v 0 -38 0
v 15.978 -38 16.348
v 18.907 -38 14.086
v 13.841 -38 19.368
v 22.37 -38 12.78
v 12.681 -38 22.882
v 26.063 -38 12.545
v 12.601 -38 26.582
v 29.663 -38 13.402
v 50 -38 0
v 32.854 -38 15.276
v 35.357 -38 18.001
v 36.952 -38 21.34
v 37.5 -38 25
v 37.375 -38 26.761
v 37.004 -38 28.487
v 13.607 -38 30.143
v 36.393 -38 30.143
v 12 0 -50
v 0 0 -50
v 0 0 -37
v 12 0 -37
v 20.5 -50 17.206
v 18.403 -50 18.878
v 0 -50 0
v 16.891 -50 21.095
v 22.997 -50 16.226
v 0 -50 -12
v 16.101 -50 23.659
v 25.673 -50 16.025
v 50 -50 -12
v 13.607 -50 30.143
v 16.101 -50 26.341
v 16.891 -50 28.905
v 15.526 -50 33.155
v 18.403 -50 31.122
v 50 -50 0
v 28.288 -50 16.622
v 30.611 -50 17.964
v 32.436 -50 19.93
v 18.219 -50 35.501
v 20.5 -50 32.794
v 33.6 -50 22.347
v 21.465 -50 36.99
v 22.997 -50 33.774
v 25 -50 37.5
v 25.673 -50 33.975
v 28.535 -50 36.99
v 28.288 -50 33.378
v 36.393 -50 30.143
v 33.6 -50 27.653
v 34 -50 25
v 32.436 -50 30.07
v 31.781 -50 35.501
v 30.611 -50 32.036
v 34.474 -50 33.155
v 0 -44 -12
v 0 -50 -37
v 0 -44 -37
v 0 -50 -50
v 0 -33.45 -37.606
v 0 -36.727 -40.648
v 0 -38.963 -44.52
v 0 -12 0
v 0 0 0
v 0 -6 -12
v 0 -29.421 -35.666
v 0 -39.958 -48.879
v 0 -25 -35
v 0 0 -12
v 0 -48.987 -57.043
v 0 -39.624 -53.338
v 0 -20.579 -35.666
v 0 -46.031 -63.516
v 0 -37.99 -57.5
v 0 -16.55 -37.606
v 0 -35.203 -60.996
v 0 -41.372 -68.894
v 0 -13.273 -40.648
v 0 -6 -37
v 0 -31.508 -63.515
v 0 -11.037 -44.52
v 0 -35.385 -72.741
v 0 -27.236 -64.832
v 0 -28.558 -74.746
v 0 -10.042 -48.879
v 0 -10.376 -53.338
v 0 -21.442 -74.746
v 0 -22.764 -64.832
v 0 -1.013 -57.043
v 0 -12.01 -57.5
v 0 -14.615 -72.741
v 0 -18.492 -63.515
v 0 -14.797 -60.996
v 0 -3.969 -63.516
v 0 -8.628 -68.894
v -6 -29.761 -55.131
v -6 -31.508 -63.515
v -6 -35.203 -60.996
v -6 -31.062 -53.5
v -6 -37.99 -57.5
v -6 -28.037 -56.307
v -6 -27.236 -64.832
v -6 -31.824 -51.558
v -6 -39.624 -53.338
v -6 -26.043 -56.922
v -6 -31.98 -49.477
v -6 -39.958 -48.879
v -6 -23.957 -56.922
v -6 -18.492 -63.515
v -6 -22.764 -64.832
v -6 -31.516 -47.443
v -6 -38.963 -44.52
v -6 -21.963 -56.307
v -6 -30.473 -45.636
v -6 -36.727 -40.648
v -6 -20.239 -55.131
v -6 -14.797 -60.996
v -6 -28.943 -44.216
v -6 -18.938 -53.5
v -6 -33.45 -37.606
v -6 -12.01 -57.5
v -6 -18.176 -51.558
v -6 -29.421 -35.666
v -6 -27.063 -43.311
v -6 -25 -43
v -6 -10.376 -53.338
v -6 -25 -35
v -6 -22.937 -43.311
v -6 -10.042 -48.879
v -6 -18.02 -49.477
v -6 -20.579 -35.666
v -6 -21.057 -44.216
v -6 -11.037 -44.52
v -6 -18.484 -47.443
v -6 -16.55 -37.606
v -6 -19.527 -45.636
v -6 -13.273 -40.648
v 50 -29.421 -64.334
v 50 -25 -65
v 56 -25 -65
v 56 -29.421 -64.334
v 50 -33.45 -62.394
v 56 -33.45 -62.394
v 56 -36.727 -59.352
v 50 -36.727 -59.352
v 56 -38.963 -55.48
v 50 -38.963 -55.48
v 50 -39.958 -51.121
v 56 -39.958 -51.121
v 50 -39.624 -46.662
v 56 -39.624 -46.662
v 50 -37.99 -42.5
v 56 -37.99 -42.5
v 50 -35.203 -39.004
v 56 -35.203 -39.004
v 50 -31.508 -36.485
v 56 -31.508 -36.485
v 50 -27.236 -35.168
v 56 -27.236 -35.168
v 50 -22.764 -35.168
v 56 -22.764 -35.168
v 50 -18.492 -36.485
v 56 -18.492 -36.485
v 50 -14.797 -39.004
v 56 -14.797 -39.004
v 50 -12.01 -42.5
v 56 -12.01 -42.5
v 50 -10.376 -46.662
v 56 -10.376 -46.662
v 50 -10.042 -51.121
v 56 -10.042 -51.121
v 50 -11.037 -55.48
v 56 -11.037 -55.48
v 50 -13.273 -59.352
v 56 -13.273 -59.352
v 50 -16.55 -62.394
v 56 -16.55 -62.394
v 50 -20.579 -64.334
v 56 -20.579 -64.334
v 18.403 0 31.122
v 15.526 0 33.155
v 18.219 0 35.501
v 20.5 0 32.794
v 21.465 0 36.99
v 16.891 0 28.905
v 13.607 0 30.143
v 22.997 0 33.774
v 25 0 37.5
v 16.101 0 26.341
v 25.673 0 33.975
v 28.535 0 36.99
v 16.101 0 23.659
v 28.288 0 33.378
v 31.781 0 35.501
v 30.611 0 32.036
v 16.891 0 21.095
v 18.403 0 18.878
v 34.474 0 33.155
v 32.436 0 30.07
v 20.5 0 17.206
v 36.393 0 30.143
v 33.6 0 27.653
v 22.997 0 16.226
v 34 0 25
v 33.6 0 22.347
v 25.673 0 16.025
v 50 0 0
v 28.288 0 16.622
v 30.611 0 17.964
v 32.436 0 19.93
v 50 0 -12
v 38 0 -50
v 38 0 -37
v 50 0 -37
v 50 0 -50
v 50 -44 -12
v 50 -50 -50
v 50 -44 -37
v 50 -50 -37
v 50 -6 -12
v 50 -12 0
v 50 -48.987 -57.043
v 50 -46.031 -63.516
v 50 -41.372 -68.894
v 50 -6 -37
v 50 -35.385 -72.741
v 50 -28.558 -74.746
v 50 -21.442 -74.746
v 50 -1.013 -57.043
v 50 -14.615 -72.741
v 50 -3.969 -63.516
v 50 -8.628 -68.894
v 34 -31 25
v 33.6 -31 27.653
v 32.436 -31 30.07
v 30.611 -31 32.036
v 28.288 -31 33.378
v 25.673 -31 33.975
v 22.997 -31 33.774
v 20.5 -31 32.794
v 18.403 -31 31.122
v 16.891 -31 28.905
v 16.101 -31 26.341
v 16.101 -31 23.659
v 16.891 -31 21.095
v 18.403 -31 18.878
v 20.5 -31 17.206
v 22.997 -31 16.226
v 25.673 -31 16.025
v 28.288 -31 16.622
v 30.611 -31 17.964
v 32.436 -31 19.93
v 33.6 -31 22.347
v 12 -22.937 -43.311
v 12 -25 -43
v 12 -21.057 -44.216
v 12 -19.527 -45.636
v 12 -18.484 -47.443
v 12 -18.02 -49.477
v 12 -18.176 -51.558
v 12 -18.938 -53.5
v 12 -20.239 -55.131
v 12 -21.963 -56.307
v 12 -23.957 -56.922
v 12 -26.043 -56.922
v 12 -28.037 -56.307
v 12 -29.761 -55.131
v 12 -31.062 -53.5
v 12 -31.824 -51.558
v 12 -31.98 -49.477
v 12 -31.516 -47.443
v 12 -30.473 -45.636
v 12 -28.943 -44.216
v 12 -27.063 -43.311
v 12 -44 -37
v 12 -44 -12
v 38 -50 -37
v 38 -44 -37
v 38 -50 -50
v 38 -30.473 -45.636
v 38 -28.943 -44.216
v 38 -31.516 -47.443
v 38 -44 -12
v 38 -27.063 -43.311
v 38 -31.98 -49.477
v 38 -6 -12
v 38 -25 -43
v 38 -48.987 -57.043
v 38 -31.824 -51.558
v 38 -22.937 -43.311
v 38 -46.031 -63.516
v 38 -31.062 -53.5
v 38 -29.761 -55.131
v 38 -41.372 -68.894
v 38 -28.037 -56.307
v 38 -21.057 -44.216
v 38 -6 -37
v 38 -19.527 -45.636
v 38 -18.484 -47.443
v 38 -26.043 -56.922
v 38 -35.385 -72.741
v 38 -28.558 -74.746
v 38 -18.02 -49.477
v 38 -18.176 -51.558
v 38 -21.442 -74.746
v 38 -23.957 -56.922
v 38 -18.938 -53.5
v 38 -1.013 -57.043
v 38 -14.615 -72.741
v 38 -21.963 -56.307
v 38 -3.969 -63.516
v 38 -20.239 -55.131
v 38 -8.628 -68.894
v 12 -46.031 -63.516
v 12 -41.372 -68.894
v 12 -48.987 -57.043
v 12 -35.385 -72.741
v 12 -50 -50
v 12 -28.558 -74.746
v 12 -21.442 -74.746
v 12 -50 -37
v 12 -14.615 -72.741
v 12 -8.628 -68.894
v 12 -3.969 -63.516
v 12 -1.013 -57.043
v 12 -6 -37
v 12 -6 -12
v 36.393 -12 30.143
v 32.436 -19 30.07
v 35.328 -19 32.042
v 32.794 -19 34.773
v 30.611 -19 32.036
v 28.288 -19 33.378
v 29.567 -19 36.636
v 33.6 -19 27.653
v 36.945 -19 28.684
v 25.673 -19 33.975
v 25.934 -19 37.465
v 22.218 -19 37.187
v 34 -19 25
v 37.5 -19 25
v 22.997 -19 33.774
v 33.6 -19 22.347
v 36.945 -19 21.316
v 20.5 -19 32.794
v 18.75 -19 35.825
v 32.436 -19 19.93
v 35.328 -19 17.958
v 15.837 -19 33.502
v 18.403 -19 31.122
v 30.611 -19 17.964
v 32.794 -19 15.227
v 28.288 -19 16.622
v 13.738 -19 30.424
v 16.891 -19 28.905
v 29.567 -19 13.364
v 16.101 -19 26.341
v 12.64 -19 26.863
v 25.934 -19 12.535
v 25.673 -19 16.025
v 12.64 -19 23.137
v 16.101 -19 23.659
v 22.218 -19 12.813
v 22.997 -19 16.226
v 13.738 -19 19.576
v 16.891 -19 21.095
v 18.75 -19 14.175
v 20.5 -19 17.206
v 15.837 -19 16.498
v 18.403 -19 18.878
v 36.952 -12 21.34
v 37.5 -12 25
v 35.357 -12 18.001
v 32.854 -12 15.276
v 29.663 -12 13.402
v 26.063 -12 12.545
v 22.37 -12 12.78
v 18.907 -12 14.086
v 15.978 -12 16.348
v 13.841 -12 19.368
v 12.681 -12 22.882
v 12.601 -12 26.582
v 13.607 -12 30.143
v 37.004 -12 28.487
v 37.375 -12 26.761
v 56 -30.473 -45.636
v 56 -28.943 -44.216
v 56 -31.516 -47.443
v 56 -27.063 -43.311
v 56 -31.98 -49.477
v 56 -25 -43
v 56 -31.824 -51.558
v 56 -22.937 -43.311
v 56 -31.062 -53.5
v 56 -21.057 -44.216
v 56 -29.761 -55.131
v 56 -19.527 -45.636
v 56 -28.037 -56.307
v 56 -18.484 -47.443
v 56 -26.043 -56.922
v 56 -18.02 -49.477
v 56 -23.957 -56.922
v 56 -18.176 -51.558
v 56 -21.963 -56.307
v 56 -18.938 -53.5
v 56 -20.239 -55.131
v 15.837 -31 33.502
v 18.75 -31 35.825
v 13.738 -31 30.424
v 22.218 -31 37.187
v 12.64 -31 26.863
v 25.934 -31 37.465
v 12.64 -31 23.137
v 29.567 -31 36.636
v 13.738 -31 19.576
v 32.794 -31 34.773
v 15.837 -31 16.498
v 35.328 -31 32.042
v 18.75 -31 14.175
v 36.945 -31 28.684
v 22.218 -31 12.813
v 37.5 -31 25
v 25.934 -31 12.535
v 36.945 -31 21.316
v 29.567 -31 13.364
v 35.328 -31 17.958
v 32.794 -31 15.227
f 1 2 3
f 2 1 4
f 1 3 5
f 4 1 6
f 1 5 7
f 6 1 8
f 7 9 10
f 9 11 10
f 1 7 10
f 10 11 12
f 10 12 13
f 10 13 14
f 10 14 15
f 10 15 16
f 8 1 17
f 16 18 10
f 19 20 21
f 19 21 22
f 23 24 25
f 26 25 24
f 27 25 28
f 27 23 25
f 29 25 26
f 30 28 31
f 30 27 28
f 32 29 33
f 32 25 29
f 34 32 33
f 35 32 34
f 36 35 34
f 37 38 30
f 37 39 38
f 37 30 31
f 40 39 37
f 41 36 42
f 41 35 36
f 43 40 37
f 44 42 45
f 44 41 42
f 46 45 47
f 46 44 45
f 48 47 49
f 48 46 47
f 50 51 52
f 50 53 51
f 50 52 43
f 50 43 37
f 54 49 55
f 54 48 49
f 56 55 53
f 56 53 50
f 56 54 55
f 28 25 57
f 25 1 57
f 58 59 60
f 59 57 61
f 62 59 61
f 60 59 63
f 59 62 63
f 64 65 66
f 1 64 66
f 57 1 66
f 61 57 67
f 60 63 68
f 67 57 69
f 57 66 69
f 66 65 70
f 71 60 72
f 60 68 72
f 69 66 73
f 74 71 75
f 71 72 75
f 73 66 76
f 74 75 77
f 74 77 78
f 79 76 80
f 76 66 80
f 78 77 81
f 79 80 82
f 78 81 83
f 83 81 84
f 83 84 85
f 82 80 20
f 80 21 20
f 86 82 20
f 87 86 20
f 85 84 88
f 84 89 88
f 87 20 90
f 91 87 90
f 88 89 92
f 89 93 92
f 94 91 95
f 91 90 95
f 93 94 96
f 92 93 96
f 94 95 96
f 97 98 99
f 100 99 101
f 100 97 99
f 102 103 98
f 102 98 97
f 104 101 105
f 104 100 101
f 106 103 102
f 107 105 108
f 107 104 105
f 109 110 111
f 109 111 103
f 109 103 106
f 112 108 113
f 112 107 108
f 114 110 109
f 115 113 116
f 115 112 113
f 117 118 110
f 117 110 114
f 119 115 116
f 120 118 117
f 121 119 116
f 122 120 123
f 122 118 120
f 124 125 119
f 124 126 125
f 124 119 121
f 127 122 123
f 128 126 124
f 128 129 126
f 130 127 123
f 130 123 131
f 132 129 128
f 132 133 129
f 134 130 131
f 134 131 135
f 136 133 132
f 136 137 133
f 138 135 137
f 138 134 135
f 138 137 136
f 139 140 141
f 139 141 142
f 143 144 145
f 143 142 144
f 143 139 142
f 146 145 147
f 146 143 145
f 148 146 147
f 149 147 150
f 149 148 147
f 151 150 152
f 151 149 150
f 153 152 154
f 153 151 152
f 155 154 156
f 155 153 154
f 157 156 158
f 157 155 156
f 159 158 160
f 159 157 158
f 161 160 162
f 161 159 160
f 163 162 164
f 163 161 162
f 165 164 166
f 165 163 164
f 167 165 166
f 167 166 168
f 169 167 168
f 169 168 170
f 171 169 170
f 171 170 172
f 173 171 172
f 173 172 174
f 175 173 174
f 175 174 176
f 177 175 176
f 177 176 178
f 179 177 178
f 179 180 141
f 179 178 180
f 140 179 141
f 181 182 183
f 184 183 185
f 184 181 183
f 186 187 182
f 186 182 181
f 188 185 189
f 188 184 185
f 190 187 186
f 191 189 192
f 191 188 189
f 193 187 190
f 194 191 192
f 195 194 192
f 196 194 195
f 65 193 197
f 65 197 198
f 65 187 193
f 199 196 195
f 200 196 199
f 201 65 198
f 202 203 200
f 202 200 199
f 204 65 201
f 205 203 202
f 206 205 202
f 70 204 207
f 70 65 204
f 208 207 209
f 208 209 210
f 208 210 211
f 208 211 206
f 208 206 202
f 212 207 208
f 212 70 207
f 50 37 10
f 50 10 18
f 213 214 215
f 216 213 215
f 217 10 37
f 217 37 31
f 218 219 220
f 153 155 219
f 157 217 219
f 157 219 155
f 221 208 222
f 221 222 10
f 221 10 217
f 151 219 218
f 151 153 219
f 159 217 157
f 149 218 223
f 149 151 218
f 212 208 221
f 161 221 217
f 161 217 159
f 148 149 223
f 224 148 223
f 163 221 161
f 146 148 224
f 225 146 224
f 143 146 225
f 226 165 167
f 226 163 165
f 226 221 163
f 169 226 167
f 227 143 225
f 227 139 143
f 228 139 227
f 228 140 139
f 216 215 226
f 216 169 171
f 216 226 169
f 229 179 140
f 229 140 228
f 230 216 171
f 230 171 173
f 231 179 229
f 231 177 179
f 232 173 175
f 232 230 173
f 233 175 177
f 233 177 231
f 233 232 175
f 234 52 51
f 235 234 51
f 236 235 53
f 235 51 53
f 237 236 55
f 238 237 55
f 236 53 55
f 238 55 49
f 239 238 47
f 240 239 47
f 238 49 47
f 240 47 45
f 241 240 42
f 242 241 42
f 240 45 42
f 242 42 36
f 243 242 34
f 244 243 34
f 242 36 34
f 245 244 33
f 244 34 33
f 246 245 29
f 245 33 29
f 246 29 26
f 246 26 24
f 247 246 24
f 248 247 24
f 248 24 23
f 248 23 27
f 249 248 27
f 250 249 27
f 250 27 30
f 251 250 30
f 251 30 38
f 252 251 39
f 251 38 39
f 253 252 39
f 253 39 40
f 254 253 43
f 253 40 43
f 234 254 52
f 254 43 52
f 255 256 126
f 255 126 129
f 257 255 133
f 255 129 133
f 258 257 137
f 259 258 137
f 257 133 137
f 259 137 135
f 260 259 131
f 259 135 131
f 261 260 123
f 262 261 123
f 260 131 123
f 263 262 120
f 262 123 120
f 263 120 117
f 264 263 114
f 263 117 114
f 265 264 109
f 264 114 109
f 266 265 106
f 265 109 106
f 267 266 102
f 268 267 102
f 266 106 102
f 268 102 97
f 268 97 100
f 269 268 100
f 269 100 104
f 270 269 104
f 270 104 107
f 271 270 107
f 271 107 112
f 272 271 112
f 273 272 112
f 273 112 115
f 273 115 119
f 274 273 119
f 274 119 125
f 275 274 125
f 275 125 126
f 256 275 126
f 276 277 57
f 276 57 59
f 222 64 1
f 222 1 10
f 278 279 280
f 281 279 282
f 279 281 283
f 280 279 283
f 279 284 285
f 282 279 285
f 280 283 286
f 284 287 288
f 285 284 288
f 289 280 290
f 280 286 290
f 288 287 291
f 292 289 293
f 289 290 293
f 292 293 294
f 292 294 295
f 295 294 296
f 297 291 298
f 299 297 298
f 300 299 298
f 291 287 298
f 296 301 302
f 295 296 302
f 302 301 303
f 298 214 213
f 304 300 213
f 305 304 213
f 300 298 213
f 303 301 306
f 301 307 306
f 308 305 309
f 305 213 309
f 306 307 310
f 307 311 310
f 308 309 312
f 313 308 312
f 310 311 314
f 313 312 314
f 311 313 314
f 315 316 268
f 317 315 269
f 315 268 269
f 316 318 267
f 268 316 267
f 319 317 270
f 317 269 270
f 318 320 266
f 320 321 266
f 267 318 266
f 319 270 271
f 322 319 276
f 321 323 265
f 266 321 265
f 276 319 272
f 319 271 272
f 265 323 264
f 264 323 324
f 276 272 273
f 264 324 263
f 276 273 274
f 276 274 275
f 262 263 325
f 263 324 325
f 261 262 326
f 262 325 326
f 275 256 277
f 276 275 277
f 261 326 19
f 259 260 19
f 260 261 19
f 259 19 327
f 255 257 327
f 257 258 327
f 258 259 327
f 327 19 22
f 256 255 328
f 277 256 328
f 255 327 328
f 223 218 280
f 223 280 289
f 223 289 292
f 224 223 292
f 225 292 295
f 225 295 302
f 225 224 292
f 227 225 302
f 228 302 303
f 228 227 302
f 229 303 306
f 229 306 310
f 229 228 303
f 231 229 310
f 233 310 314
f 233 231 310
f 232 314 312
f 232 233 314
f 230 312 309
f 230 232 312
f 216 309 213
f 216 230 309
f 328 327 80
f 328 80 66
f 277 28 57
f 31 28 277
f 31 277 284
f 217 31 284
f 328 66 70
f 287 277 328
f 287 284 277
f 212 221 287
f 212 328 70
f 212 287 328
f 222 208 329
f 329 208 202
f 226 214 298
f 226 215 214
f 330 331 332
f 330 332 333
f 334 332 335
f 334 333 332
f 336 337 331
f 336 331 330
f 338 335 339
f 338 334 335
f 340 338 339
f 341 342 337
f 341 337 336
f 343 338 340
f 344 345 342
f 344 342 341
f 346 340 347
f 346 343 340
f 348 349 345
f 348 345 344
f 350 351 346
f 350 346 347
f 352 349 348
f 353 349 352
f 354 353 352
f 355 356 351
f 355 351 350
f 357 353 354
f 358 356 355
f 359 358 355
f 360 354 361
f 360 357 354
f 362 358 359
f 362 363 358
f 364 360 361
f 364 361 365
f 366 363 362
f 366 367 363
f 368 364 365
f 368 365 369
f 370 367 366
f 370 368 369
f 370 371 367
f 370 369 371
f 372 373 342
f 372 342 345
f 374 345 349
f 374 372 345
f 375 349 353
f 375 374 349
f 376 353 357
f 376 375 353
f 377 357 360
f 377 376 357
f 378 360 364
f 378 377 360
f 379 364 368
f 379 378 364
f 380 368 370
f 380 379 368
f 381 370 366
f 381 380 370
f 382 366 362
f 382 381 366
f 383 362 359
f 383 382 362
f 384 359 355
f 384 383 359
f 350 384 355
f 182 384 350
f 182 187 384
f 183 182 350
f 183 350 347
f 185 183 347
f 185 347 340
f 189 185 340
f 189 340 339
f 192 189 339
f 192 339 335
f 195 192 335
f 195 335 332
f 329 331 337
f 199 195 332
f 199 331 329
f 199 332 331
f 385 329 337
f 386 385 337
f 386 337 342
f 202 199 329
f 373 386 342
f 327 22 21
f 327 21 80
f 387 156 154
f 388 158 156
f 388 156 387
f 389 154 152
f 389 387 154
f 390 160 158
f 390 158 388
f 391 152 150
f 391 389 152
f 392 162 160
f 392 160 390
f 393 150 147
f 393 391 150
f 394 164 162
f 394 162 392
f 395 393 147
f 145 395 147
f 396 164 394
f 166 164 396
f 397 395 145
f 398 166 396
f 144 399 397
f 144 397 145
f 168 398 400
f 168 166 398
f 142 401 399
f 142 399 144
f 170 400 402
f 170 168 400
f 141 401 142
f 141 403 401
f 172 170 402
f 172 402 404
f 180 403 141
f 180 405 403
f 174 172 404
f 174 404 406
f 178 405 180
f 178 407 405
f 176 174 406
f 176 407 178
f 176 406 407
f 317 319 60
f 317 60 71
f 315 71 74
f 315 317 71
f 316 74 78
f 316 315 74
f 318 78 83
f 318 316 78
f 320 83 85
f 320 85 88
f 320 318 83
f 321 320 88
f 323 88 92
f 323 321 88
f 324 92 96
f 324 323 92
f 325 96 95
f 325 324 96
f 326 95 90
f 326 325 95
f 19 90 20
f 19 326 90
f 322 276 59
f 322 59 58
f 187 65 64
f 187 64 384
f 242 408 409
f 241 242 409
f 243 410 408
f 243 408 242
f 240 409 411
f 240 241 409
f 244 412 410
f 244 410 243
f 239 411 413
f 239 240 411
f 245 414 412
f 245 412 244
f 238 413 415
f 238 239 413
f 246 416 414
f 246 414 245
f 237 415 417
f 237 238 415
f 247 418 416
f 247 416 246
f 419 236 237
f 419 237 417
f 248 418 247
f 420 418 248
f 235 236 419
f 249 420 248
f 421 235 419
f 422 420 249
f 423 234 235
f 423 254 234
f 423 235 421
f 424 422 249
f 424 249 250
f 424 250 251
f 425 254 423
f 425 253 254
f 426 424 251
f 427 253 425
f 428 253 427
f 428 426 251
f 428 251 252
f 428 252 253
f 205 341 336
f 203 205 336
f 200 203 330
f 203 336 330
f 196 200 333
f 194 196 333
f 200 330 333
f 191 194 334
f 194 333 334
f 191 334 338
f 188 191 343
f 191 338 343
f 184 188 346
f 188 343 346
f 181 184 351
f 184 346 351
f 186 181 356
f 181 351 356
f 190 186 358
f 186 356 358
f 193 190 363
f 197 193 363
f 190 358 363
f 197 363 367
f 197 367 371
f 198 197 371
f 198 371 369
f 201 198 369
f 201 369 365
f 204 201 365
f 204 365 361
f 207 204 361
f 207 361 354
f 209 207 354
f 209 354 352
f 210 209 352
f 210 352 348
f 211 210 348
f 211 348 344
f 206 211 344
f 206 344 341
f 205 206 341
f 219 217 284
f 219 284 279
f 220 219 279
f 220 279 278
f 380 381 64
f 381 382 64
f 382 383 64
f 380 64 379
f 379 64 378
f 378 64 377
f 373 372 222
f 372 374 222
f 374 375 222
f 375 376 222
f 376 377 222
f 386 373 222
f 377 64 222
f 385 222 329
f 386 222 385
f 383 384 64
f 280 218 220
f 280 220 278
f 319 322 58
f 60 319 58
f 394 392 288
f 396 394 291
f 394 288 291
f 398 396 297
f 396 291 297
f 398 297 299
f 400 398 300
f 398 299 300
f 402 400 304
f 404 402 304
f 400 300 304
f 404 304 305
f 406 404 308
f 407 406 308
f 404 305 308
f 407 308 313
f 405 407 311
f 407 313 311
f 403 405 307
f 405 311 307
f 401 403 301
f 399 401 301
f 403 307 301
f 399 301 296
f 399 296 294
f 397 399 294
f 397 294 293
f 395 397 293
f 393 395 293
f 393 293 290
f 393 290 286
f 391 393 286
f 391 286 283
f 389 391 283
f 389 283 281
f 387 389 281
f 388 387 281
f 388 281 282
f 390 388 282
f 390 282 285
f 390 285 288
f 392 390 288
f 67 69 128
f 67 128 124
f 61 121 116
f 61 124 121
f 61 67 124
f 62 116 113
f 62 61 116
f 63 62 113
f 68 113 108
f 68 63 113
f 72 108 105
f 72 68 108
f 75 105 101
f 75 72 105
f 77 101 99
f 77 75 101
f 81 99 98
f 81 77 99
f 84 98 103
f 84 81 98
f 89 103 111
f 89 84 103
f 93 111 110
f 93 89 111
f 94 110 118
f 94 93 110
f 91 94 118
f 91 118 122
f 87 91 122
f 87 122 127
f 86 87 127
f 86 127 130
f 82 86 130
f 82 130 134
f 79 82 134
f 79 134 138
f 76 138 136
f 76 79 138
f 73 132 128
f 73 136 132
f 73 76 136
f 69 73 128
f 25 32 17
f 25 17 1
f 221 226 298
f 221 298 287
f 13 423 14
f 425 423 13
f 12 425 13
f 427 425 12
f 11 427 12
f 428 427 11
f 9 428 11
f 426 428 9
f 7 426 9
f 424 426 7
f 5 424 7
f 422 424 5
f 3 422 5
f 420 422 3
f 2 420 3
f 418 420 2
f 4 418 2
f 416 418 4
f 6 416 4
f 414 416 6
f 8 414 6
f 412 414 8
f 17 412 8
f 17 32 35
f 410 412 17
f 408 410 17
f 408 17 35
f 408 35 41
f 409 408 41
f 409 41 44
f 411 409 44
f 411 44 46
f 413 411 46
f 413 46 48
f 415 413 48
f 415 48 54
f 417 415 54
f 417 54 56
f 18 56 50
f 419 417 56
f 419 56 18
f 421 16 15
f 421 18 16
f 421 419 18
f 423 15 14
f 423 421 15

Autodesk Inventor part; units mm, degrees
ref_plane "YZ Plane" through (0, 0, 0) normal (1, 0, 0) x (0, 1, 0)
ref_plane "XZ Plane" through (0, 0, 0) normal (0, 1, 0) x (-1, 0, 0)
ref_plane "XY Plane" through (0, 0, 0) normal (0, 0, 1) x (1, 0, 0)
sketch "Náčrt1" plane through (0, 0, 0) normal (0, 0, 1) x (1, 0, 0)
  line L0 (0, 0) -> (50, 0)
  line L1 (50, 0) -> (50, -50)
  line L2 (50, -50) -> (0, -50)
  line L3 (0, -50) -> (0, 0)
  dimension "d0" = 50
  dimension "d1" = 50
extrude "Vysunutí1" add sketch "Náčrt1" against normal blind 50
sketch "Náčrt2" plane through (0, 0, 0) normal (0, 1, 0) x (1, 0, 0)
  line L0 (12, 12) -> (38, 12)
  line L1 (38, 12) -> (38, 50)
  line L2 (38, 50) -> (12, 50)
  line L3 (12, 50) -> (12, 12)
  line L4 (0, 50) -> (50, 50) projected
  line L5 (0, 0) -> (0, 50) projected
  dimension "d4" = 12
  dimension "d5" = 26
  dimension "d6" = 38
extrude "Vysunutí2" cut sketch "Náčrt2" against normal blind 50
sketch "Náčrt3" plane through (50, -50, 0) normal (1, 0, 0) x (0, 0, -1)
  line L0 (12, 50) -> (37, 50)
  line L1 (37, 50) -> (37, 44)
  line L2 (37, 44) -> (12, 44)
  line L3 (12, 44) -> (12, 50)
  line L4 (0, 50) -> (50, 50) projected
  line L5 (0, 0) -> (0, 50) projected
  point P0 (37, 47)
  point P1 (12, 47)
  dimension "d9" = 12
  dimension "d10" = 25
  dimension "d11" = 6
extrude "Vysunutí3" cut sketch "Náčrt3" against normal blind 50
sketch "Náčrt4" plane through (50, -50, 0) normal (1, 0, 0) x (0, 0, -1)
  line L0 (12, 6) -> (37, 6)
  line L1 (37, 6) -> (37, 0)
  line L2 (37, 0) -> (12, 0)
  line L3 (12, 0) -> (12, 6)
  line L4 (0, 0) -> (50, 0) projected
  line L5 (0, 0) -> (0, 50) projected
  point P0 (37, 3)
  point P1 (12, 3)
  dimension "d14" = 12
  dimension "d15" = 6
  dimension "d16" = 25
extrude "Vysunutí4" cut sketch "Náčrt4" against normal blind 50
sketch "Náčrt5" plane through (50, -50, 0) normal (1, 0, 0) x (0, 0, -1)
  line L0 (50, 0) -> (50, 50) projected
  arc A0 (50, 0) -> (50, 50) centre (50, 25) ccw
  point P0 (0, 50)
extrude "Vysunutí5" add sketch "Náčrt5" against normal blind 50
sketch "Náčrt6" plane through (38, 0, -37) normal (0, 1, 0) x (1, 0, 0)
  line L0 (-26, 13) -> (-38, 13) projected
  line L1 (-26, 13) -> (0, 13)
  line L2 (0, 13) -> (0, 55.1409)
  line L3 (0, 55.1409) -> (-26, 55.1409)
  line L4 (-26, 55.1409) -> (-26, 13)
  point P0 (-38, -37)
extrude "Vysunutí6" cut sketch "Náčrt6" against normal blind 50
sketch "Náčrt7" plane through (50, -50, 0) normal (1, 0, 0) x (0, 0, -1)
  circle A0 centre (50, 25) radius 15
  point P0 (0, 50)
  dimension "d23" = 30
extrude "Vysunutí7" add sketch "Náčrt7" along normal blind 6
sketch "Náčrt8" plane through (0, -50, 0) normal (-1, 0, 0) x (0, 0, 1)
  circle A0 centre (-50, 25) radius 15 projected
  circle A1 centre (-50, 25) radius 15
  point P0 (0, 50)
extrude "Vysunutí8" add sketch "Náčrt8" along normal blind 6
sketch "Náčrt9" plane through (-6, -25, -50) normal (-1, 0, 0) x (0, 0, 1)
  circle A0 centre (0, 0) radius 7
  point P0 (50, 25)
  dimension "d28" = 14
extrude "Vysunutí9" cut sketch "Náčrt9" against normal blind 100
sketch "Náčrt10" plane through (0, 0, 0) normal (0, 1, 0) x (1, 0, 0)
  circle A0 centre (25, -25) radius 12.5
  line L0 (0, 0) -> (13.607, -30.143)
  line L1 (50, 0) -> (50, 12) projected
  line L2 (50, 0) -> (36.393, -30.143)
  dimension "d31" = 25
extrude "Vysunutí10" add sketch "Náčrt10" against normal blind 50
sketch "Náčrt11" plane through (25, 0, 25) normal (0, 1, 0) x (1, 0, 0)
  point P0 (-25, 25)
sketch "Náčrt12" plane through (0, 0, 0) normal (0, 1, 0) x (1, 0, 0)
  line L0 (50, 0) -> (0, 0) projected
  line L1 (0, 0) -> (13.607, -30.143)
  line L2 (50, 0) -> (36.393, -30.143)
  circle A0 centre (25, -25) radius 12.5 projected
extrude "Vysunutí11" add sketch "Náčrt12" against normal blind 12 contours L2 A0 L1 L0
sketch "Náčrt13" plane through (0, -50, 0) normal (0, -1, 0) x (1, 0, 0)
  line L0 (50, 0) -> (50, -12) projected
  line L1 (50, 0) -> (36.393, 30.143)
  line L2 (13.607, 30.143) -> (0, 0) projected
  line L3 (0, 0) -> (13.607, 30.143)
  circle A0 centre (25, 25) radius 12.5 projected
  line L4 (50, 0) -> (50, -12) projected
  line L5 (0, 0) -> (0, -12) projected
  line L6 (50, 0) -> (0, 0)
extrude "Vysunutí12" add sketch "Náčrt13" against normal blind 12 contours L6 L2 A0 L1
sketch "Náčrt16" plane through (0, 0, 0) normal (0, 0, 1) x (1, 0, 0)
  point P0 (0, 0)
sketch "Náčrt17" plane through (0, 0, 0) normal (0, 0, 1) x (1, 0, 0)
  point P0 (0, 0)
sketch "Náčrt18" plane through (0, 0, 0) normal (0, 0, 1) x (1, 0, 0)
  line L0 (50, -10) -> (50, -40) projected
  line L1 (0, 0) -> (0, -50) projected
  line L2 (50, -19) -> (0, -19)
  line L3 (0, -19) -> (0, -31)
  line L4 (0, -31) -> (50, -31)
  line L5 (50, -31) -> (50, -19)
  dimension "d38" = 12
extrude "Vysunutí13" cut sketch "Náčrt18" along normal blind 100
sketch "Náčrt19" plane through (0, -50, -12) normal (0, -1, 0) x (1, 0, 0)
  arc A0 (13.607, 42.143) -> (36.393, 42.143) centre (25, 37) ccw projected
  circle A1 centre (25, 37) radius 9
  point P0 (0, 12)
  dimension "d41" = 18
extrude "Vysunutí14" cut sketch "Náčrt19" against normal blind 100
properties part number "Opakování_1" material "Stříbro"
